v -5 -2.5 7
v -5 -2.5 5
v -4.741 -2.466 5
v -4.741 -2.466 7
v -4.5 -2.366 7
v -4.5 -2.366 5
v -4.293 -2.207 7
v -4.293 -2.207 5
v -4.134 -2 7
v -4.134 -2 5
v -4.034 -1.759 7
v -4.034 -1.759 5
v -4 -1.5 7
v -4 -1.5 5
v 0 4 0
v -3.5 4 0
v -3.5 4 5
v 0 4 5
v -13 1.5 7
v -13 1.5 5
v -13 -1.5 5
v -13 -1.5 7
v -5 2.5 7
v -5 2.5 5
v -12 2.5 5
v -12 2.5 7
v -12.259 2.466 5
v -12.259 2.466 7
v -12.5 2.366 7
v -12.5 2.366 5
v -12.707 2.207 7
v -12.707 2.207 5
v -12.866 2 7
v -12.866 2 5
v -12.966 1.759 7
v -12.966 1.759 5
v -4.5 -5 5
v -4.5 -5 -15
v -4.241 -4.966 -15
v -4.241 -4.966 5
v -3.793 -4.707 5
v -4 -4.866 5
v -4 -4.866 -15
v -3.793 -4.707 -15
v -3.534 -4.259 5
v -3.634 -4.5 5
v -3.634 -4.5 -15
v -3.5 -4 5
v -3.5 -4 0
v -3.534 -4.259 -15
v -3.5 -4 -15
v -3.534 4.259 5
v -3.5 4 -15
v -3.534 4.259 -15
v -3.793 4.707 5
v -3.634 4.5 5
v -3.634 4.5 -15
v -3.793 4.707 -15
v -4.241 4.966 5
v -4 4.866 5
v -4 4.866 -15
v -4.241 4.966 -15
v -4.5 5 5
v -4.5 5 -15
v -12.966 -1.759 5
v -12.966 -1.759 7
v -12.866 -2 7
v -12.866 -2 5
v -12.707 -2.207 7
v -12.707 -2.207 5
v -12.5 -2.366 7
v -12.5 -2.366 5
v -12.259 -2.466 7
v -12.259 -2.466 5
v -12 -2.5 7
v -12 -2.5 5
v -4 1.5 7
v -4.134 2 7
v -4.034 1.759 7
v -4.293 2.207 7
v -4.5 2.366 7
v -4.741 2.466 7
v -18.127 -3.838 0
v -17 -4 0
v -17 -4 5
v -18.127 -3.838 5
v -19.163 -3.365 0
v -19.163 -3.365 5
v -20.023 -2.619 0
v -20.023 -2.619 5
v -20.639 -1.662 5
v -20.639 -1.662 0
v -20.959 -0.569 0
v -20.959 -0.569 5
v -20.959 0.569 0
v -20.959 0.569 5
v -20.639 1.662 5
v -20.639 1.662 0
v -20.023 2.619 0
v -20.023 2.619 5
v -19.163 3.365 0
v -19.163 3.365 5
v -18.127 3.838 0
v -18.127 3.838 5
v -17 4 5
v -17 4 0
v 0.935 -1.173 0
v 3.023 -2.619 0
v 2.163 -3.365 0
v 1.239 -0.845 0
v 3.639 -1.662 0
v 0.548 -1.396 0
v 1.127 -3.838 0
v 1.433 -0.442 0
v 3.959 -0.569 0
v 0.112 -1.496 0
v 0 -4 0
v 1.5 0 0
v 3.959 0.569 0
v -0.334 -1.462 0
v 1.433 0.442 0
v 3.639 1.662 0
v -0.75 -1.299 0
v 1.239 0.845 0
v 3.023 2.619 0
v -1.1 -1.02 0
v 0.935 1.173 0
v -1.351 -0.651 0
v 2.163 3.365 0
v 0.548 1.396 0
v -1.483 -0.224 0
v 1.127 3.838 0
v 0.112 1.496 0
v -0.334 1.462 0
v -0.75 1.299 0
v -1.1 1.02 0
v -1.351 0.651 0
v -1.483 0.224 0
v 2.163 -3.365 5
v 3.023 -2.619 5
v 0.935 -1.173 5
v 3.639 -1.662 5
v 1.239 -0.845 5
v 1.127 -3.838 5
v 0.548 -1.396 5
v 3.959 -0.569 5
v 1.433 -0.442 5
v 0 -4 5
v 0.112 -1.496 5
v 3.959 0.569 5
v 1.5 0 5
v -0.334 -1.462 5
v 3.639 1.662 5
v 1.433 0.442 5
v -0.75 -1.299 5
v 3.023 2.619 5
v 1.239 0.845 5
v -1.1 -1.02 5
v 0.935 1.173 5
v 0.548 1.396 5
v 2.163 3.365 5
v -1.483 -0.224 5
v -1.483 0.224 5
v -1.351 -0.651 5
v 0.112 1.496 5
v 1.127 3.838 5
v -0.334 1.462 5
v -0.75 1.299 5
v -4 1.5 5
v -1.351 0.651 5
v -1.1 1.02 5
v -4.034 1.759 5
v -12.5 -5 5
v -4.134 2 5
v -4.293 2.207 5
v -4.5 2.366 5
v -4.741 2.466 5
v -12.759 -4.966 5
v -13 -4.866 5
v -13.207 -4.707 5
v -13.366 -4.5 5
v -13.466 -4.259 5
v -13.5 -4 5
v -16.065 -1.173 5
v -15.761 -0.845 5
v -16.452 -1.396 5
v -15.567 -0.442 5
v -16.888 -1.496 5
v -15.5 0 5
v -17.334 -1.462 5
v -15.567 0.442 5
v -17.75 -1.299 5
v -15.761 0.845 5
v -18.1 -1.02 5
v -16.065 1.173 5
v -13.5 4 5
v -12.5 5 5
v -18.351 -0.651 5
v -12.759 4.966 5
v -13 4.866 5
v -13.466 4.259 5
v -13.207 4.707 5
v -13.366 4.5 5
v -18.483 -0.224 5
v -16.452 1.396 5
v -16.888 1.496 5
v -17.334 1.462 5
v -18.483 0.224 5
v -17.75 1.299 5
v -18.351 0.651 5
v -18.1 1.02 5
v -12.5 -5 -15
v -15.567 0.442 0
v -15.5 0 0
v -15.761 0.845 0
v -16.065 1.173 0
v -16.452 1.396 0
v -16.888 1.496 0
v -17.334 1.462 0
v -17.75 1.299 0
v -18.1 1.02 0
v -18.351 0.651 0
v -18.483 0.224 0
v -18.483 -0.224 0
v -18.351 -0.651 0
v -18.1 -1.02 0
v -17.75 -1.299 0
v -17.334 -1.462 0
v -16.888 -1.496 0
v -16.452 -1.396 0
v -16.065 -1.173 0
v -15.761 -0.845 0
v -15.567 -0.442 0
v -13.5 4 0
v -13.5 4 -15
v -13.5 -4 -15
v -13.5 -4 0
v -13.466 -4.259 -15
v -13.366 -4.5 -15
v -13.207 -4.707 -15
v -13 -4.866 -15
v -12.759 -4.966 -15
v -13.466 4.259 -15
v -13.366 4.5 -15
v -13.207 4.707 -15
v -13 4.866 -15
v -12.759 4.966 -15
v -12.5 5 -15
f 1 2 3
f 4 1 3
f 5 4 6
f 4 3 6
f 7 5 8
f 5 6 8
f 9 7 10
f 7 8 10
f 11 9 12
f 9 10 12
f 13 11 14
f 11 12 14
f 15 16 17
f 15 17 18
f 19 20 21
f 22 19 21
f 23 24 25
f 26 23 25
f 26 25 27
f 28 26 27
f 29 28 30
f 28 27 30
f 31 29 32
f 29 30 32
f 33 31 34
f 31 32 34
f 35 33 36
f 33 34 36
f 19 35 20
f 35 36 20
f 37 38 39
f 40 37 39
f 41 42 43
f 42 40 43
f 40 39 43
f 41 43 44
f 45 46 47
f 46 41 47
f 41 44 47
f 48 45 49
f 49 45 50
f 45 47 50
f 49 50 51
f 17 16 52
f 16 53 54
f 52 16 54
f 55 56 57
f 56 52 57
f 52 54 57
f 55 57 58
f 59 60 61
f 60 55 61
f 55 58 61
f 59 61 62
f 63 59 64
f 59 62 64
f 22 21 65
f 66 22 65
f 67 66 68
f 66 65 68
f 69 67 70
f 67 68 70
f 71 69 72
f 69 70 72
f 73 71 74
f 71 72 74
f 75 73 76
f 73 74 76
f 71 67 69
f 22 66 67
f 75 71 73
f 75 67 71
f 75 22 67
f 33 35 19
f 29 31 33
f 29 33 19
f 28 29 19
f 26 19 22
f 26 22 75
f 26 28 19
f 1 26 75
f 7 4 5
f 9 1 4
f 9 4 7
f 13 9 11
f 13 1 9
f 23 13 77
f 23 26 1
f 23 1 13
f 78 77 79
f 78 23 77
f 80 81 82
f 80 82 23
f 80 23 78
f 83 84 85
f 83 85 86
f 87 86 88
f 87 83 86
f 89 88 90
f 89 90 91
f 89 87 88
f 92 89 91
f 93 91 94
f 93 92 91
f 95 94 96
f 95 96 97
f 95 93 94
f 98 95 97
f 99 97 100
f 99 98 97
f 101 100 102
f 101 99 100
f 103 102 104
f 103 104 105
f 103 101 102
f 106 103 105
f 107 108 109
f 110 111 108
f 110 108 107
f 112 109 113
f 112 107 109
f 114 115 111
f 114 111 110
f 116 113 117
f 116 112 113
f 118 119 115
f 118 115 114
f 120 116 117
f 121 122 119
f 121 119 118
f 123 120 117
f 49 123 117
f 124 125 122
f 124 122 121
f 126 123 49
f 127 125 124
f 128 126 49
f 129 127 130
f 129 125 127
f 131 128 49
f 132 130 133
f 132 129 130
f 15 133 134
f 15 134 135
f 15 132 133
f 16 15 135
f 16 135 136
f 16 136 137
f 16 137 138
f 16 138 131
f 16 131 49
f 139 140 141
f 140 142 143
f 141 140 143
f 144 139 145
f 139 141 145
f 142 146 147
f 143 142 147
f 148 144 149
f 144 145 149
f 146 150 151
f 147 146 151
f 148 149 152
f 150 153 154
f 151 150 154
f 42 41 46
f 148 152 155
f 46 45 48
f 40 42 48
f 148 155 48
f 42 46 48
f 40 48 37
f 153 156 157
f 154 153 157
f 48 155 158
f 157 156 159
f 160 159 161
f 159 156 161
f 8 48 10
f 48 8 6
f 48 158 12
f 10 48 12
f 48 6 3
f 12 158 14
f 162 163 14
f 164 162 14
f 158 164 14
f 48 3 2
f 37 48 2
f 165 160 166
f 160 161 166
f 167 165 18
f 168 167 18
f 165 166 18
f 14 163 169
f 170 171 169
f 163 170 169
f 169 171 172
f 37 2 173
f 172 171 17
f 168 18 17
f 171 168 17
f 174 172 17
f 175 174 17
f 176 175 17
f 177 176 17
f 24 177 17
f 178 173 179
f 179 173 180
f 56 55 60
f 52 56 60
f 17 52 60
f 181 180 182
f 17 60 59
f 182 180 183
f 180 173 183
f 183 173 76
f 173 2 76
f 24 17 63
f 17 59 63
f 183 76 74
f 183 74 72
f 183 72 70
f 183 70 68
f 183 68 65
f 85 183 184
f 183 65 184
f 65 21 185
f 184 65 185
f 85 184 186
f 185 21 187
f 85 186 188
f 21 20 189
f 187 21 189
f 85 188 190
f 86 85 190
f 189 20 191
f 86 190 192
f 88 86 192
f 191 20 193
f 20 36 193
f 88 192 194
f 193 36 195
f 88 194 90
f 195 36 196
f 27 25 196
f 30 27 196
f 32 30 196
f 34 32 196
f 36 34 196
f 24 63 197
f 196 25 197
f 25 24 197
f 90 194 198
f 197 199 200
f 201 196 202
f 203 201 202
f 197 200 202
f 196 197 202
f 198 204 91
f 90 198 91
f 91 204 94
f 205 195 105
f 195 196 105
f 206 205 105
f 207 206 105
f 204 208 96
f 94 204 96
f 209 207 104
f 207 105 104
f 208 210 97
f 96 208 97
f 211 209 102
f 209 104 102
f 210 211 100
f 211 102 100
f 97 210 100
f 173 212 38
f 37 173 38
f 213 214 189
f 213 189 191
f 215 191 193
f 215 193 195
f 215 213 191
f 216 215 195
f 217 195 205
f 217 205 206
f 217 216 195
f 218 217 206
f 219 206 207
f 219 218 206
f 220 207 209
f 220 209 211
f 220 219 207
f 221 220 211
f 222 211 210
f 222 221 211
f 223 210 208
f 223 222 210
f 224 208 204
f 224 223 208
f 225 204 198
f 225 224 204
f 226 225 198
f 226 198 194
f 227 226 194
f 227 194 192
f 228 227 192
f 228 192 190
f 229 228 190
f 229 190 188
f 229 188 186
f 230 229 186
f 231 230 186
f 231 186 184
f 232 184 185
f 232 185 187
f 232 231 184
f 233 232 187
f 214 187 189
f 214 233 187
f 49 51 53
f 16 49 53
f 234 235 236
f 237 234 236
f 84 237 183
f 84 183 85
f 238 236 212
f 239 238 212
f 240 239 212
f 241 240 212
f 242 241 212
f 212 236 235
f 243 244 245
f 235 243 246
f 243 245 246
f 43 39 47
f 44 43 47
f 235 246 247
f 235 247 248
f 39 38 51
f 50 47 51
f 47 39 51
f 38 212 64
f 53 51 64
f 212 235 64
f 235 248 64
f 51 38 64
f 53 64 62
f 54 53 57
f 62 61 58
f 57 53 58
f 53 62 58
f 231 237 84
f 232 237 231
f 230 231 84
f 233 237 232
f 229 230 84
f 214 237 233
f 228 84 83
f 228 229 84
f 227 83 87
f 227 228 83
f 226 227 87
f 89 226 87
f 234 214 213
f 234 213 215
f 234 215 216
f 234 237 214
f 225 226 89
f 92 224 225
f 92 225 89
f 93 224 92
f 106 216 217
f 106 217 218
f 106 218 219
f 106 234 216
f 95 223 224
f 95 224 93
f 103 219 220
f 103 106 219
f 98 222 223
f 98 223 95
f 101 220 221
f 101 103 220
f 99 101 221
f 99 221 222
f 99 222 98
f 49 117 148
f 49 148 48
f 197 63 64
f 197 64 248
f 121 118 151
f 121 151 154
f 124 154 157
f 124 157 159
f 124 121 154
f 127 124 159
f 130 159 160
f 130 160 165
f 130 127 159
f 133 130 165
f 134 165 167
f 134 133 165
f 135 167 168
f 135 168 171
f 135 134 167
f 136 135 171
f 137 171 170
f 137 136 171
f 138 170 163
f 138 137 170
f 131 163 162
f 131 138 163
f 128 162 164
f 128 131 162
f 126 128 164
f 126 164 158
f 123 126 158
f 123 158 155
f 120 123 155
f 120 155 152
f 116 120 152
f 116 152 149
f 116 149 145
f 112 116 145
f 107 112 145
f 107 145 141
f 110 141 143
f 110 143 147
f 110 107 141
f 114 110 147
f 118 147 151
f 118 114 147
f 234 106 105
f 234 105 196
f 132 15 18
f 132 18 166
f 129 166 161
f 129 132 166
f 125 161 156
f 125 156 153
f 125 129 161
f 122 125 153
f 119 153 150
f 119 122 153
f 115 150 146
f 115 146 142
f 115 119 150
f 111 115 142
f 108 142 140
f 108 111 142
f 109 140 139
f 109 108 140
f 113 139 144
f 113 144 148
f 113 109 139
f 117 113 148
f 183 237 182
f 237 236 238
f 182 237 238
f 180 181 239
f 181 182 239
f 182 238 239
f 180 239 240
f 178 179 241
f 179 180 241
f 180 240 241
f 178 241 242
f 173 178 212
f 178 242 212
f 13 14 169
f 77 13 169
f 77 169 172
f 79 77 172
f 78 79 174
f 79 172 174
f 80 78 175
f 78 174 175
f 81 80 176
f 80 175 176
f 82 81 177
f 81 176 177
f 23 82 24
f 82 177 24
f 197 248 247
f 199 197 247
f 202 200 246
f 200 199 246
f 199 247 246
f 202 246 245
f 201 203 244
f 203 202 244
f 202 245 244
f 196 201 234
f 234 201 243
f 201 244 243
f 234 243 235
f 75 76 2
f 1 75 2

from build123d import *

# Parameters (mm, degrees)
SKETCH2_R           = 1.5
BOSS_EXTRUDE1_DEPTH = 5
BOSS_EXTRUDE2_DEPTH = 2
BOSS_EXTRUDE3_START = -15
BOSS_EXTRUDE3_DEPTH = 15


with BuildPart() as part:
    # Sketch2 → Boss-Extrude1 (new body)
    with BuildSketch(Plane.XY):
        with BuildLine():
            Line((0, 4), (-3.5, 4))
            ThreePointArc((-3.5, 4), (-3.792893219, 4.707106781), (-4.5, 5))
            Line((-4.5, 5), (-12.5, 5))
            ThreePointArc((-12.5, 5), (-13.207106781, 4.707106781), (-13.5, 4))
            Line((-13.5, 4), (-17, 4))
            ThreePointArc((-17, 4), (-21, 0), (-17, -4))
            Line((-17, -4), (-13.5, -4))
            ThreePointArc((-13.5, -4), (-13.207106781, -4.707106781), (-12.5, -5))
            Line((-12.5, -5), (-4.5, -5))
            ThreePointArc((-4.5, -5), (-3.792893219, -4.707106781), (-3.5, -4))
            Line((-3.5, -4), (0, -4))
            ThreePointArc((0, -4), (4, 0), (0, 4))
        make_face()
        Circle(SKETCH2_R, mode=Mode.SUBTRACT)
        with Locations((-17, 0)):
            Circle(SKETCH2_R, mode=Mode.SUBTRACT)
    extrude(amount=BOSS_EXTRUDE1_DEPTH)

    # Sketch3 → Boss-Extrude2 (add)
    with BuildSketch(Plane.XY.offset(5)):
        with BuildLine():
            Line((-12, -2.5), (-5, -2.5))
            ThreePointArc((-5, -2.5), (-4.292893219, -2.207106781), (-4, -1.5))
            Line((-4, -1.5), (-4, 1.5))
            ThreePointArc((-4, 1.5), (-4.292893219, 2.207106781), (-5, 2.5))
            Line((-5, 2.5), (-12, 2.5))
            ThreePointArc((-12, 2.5), (-12.707106781, 2.207106781), (-13, 1.5))
            Line((-13, 1.5), (-13, -1.5))
            ThreePointArc((-13, -1.5), (-12.707106781, -2.207106781), (-12, -2.5))
        make_face()
    extrude(amount=BOSS_EXTRUDE2_DEPTH)

    # Sketch2<3> → Boss-Extrude3 (add)
    with BuildSketch(Plane.XY.offset(BOSS_EXTRUDE3_START)):
        with BuildLine():
            Line((-3.5, -4), (-3.5, 4))
            ThreePointArc((-3.5, 4), (-3.792893219, 4.707106781), (-4.5, 5))
            Line((-4.5, 5), (-12.5, 5))
            ThreePointArc((-12.5, 5), (-13.207106781, 4.707106781), (-13.5, 4))
            Line((-13.5, 4), (-13.5, -4))
            ThreePointArc((-13.5, -4), (-13.207106781, -4.707106781), (-12.5, -5))
            Line((-12.5, -5), (-4.5, -5))
            ThreePointArc((-4.5, -5), (-3.792893219, -4.707106781), (-3.5, -4))
        make_face()
    extrude(amount=BOSS_EXTRUDE3_DEPTH)


solid = part.part
